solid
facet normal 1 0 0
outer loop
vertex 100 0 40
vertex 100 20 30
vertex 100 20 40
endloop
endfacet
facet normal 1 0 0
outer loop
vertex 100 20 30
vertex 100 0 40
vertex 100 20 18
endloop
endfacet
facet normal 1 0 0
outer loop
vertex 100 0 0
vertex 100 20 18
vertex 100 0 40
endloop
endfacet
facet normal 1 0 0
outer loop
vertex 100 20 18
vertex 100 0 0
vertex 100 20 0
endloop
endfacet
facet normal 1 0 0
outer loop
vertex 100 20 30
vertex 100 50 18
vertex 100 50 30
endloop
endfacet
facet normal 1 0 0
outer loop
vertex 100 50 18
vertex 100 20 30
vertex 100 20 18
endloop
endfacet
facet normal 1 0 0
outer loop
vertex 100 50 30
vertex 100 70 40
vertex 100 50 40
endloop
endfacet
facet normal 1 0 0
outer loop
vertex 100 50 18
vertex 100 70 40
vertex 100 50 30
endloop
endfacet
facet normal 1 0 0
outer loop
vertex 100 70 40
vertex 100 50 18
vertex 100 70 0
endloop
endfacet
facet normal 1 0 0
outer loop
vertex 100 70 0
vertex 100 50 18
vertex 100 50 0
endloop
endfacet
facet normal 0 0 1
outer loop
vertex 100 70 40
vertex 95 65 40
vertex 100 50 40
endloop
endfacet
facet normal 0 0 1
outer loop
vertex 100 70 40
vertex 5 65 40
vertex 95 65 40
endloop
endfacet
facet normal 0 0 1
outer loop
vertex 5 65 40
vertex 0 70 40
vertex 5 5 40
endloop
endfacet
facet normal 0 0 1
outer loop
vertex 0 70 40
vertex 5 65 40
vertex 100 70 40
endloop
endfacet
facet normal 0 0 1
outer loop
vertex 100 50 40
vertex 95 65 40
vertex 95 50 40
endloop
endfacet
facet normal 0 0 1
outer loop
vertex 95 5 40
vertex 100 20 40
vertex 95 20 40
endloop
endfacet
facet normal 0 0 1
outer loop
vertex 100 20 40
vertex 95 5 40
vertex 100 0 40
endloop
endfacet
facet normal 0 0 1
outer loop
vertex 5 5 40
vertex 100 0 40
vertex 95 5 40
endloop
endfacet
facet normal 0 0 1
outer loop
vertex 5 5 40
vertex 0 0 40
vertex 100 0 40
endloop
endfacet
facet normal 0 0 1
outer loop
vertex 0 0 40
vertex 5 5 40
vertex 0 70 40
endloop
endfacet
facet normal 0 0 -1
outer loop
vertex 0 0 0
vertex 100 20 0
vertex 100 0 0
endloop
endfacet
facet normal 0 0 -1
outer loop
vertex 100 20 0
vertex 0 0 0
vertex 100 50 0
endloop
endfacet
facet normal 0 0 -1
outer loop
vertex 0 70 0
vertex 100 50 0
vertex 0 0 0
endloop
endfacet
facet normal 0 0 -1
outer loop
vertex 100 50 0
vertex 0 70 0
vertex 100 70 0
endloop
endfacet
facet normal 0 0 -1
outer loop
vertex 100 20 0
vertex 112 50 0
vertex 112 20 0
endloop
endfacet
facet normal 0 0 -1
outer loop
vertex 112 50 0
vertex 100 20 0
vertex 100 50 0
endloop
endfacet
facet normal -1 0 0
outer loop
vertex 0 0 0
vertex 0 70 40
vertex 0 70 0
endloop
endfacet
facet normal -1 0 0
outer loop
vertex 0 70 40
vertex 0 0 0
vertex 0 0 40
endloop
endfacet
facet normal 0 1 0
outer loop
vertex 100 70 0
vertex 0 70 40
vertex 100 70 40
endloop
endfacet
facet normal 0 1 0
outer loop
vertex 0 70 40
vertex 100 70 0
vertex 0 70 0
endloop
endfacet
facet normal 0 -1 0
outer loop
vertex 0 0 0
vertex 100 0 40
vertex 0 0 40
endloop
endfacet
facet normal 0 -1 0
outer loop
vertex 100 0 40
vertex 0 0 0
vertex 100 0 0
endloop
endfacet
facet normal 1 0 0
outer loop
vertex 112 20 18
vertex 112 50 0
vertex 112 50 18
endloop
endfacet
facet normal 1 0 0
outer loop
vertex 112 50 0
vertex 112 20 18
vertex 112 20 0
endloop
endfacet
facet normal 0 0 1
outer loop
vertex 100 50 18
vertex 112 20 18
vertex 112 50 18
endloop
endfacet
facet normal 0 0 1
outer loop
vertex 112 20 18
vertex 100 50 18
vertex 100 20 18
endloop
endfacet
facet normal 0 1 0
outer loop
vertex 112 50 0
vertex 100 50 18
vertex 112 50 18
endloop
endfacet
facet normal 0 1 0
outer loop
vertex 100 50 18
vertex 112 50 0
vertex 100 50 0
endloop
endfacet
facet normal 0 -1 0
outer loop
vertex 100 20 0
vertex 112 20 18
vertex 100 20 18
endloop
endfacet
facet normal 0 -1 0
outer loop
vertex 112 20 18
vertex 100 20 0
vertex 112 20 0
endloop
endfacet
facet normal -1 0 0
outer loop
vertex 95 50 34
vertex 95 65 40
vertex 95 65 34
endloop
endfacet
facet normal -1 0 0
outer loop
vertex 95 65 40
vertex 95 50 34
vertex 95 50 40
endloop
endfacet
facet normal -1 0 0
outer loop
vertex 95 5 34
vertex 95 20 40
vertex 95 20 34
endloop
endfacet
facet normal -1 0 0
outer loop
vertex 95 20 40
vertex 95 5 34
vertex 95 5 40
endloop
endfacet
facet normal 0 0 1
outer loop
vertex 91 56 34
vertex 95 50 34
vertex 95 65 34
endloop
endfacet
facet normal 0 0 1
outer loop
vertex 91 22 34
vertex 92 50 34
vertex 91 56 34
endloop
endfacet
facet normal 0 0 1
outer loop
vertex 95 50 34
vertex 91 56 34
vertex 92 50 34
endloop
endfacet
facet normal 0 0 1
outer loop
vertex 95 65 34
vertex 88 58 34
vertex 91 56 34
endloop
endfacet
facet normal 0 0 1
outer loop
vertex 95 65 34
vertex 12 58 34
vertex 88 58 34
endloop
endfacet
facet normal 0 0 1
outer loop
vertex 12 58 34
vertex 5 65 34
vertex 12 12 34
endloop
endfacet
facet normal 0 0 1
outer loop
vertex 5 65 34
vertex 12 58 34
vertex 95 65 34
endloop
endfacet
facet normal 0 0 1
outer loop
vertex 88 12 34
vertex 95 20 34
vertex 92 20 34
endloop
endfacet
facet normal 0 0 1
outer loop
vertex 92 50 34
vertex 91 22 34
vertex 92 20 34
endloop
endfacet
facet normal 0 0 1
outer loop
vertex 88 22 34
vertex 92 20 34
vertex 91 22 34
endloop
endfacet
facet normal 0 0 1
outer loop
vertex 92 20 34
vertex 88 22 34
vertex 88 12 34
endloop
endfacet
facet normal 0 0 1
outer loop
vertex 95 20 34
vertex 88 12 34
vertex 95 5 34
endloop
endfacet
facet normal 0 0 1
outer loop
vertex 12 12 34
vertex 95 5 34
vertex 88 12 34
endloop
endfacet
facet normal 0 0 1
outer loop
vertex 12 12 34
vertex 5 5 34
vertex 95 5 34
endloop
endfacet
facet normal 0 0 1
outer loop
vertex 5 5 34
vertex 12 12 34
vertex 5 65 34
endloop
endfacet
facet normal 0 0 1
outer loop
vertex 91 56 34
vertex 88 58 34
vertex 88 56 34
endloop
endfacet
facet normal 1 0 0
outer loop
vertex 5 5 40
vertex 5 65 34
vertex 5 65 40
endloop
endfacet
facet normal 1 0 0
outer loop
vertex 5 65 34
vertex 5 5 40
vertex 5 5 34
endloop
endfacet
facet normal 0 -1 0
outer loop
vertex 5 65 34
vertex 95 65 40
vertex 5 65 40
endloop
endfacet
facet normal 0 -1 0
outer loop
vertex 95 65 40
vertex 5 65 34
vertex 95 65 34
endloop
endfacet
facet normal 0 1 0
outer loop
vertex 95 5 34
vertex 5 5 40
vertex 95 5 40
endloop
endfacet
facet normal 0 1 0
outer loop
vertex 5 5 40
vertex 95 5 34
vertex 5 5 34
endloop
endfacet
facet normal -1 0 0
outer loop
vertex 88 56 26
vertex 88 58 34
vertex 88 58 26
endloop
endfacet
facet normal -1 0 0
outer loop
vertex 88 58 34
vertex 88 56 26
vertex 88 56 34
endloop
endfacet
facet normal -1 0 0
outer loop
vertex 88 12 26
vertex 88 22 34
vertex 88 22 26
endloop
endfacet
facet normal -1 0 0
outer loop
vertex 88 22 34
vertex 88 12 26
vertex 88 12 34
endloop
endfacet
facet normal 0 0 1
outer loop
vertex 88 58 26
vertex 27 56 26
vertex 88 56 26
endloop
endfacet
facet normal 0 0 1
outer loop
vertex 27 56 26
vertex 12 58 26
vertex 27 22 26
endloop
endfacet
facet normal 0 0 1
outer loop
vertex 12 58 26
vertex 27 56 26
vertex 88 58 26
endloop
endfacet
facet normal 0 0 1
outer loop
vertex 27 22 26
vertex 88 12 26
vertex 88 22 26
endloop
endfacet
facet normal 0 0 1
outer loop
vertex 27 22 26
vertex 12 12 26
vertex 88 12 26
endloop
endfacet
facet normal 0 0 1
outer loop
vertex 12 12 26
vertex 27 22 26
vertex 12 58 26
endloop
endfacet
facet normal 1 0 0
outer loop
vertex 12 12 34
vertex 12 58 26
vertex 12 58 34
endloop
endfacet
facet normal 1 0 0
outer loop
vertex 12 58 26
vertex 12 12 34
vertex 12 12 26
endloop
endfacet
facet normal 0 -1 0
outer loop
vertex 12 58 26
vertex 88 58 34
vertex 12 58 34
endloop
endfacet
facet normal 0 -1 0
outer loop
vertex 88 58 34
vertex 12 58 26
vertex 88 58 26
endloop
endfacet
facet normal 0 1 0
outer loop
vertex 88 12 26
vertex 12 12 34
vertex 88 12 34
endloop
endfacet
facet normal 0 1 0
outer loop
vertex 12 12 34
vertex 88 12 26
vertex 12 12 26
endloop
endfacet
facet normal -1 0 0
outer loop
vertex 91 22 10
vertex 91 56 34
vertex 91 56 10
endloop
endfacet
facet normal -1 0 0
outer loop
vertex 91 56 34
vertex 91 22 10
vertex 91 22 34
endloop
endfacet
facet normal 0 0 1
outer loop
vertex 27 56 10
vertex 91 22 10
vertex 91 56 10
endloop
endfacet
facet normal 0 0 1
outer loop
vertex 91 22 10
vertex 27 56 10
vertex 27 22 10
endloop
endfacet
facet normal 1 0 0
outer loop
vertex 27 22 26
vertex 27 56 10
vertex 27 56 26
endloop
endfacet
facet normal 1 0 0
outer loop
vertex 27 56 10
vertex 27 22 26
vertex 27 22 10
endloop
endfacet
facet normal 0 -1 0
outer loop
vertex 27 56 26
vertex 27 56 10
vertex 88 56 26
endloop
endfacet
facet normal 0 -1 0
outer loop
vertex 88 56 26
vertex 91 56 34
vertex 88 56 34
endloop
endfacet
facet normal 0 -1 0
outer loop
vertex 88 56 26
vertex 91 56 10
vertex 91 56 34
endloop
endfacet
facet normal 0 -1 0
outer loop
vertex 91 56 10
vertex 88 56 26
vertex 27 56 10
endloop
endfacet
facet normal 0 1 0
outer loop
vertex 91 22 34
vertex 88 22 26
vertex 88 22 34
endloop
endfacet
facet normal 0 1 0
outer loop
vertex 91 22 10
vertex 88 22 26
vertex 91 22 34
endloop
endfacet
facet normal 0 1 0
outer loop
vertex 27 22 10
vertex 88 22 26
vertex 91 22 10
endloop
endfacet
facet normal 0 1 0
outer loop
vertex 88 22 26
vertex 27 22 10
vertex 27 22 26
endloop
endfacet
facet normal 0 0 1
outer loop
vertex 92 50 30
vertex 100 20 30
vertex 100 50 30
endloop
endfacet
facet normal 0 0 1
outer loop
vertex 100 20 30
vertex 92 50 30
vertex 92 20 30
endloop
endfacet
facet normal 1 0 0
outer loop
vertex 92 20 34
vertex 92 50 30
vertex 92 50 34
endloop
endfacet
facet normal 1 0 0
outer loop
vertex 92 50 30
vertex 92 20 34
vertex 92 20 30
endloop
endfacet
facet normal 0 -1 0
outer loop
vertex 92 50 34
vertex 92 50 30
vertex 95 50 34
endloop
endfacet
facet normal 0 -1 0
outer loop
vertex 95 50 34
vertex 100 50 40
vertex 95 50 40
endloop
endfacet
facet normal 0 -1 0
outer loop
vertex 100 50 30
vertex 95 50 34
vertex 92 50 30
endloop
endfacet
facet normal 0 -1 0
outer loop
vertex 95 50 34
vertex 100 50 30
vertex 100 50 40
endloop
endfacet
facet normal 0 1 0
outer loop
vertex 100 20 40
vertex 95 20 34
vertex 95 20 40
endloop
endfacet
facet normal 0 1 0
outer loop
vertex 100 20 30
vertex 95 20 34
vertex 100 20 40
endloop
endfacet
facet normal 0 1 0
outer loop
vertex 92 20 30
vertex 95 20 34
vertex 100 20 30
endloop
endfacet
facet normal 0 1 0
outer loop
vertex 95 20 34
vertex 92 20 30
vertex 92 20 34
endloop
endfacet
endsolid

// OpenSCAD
// =====================================================================
//  Stepped-cavity enclosure block
//  - Rectangular solid opened from the top into nested stepped pockets
//  - Deepest pocket offset to one side (uneven interior ledges)
//  - One rectangular boss on a side face, with a side recess above it
// =====================================================================

$fn = 64;
eps = 0.01;                       // overlap to keep cuts clean

// ---------------- Main body ----------------
body_w  = 100;                    // X size
body_d  = 70;                     // Y size
body_h  = 40;                     // Z size

// ---------------- Tier 1 : broad upper recess (inside thin rim) ------
rim_w    = 5;                     // thin rim left around the top opening
t1_inset = rim_w;                 // inset from every outer face
t1_depth = 6;                     // depth measured from the top face

// ---------------- Tier 2 : mid pocket --------------------------------
t2_inset = t1_inset + 7;          // additional step ledge
t2_depth = 14;                    // depth from the top face

// ---------------- Tier 3 : deepest pocket (shifted sideways) ---------
t3_inset   = t2_inset + 6;        // nominal inset before shifting
t3_shift_x = 9;                   // offset toward +X  -> uneven ledges
t3_shift_y = 4;                   // offset toward +Y
t3_depth   = 30;                  // depth from the top face
floor_t    = body_h - t3_depth;   // remaining solid bottom (10 mm)

// ---------------- Side boss (added material) -------------------------
boss_w = 12;                      // projection out of the +X face
boss_d = 30;                      // length along Y
boss_h = 18;                      // height, starting at the bottom
boss_y = (body_d - boss_d) / 2;   // centred on the side face

// ---------------- Side recess above the boss -------------------------
sr_depth = 10;                    // depth from the top face
sr_w     = 8;                     // cut into the wall from the +X face
sr_d     = boss_d;                // same footprint width as the boss

// =====================================================================
//  Modules
// =====================================================================

// Solid outer block
module main_block() {
    cube([body_w, body_d, body_h]);
}

// Generic top pocket: inset from -X/-Y corner, given size and depth
module top_pocket(x0, y0, sx, sy, depth) {
    translate([x0, y0, body_h - depth])
        cube([sx, sy, depth + eps]);
}

// The three nested pockets forming the stepped cavity
module stepped_cavity() {
    // Tier 1 : broad upper recess bounded by the thin rim
    top_pocket(t1_inset, t1_inset,
               body_w - 2*t1_inset, body_d - 2*t1_inset,
               t1_depth);

    // Tier 2 : smaller inset rectangular pocket
    top_pocket(t2_inset, t2_inset,
               body_w - 2*t2_inset, body_d - 2*t2_inset,
               t2_depth);

    // Tier 3 : deepest pocket, shifted to one side (asymmetric ledges)
    top_pocket(t3_inset + t3_shift_x, t3_inset + t3_shift_y,
               body_w - 2*t3_inset, body_d - 2*t3_inset,
               t3_depth);
}

// Rectangular recess cut into the +X side wall, above the boss
module side_recess() {
    translate([body_w - sr_w, boss_y, body_h - sr_depth])
        cube([sr_w + eps, sr_d, sr_depth + eps]);
}

// Rectangular projection on the +X side face
module side_boss() {
    translate([body_w, boss_y, 0])
        cube([boss_w, boss_d, boss_h]);
}

// =====================================================================
//  Assembly : solid body + boss, minus all cavities
// =====================================================================
module stepped_enclosure() {
    difference() {
        union() {
            main_block();         // base solid
            side_boss();          // added side projection
        }
        stepped_cavity();         // nested top pockets (solid bottom kept)
        side_recess();            // extra stepped tier on the side wall
    }
}

stepped_enclosure();
